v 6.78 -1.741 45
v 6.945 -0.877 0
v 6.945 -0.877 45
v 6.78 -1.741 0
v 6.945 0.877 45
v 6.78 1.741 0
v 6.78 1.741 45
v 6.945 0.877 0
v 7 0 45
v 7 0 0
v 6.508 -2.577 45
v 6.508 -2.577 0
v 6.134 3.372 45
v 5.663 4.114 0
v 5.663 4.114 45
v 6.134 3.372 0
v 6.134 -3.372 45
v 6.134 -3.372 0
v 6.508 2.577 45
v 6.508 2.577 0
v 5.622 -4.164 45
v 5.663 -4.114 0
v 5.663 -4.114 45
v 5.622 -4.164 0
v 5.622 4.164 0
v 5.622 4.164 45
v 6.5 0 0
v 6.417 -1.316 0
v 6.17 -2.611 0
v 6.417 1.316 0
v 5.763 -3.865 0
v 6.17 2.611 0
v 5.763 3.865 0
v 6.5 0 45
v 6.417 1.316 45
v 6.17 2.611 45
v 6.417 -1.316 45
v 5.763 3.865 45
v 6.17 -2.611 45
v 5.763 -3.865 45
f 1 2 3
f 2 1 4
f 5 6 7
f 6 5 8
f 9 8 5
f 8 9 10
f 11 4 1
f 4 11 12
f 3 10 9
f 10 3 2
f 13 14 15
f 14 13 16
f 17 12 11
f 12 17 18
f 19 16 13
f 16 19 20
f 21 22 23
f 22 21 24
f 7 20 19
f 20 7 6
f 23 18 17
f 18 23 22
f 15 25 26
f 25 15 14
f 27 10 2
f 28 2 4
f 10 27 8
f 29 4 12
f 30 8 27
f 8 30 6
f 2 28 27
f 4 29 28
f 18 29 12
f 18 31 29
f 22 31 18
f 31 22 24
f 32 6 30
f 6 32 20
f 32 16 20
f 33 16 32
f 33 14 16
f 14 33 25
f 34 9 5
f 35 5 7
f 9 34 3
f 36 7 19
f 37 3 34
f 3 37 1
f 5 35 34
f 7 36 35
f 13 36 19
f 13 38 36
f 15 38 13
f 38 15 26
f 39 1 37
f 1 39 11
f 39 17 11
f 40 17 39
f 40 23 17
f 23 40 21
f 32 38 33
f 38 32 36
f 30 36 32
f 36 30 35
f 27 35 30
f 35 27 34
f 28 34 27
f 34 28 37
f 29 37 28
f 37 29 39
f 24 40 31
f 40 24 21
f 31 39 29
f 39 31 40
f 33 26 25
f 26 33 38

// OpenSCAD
$fn = 50;


difference() {
	union() {
		cylinder(h = 45, r = 7.0000000000);
		translate(v = [-7.0000000000, 0, 0]) {
			cylinder(h = 45, r = 7.0000000000);
		}
	}
	union() {
		cylinder(h = 45, r = 3.2500000000);
		cylinder(h = 45, r = 1.8000000000);
		cylinder(h = 45, r = 1.8000000000);
		cylinder(h = 45, r = 1.8000000000);
		translate(v = [-11.5000000000, 0, 0]) {
			hull() {
				translate(v = [-3.7500000000, 0.0000000000, 0]) {
					cylinder(h = 45, r = 7.5000000000);
				}
				translate(v = [3.7500000000, 0.0000000000, 0]) {
					cylinder(h = 45, r = 7.5000000000);
				}
				translate(v = [-3.7500000000, -0.0000000000, 0]) {
					cylinder(h = 45, r = 7.5000000000);
				}
				translate(v = [3.7500000000, -0.0000000000, 0]) {
					cylinder(h = 45, r = 7.5000000000);
				}
			}
		}
		translate(v = [-4.0000000000, 0, 0.0000000000]) {
			cylinder(h = 45, r = 10.5000000000);
		}
	}
}
